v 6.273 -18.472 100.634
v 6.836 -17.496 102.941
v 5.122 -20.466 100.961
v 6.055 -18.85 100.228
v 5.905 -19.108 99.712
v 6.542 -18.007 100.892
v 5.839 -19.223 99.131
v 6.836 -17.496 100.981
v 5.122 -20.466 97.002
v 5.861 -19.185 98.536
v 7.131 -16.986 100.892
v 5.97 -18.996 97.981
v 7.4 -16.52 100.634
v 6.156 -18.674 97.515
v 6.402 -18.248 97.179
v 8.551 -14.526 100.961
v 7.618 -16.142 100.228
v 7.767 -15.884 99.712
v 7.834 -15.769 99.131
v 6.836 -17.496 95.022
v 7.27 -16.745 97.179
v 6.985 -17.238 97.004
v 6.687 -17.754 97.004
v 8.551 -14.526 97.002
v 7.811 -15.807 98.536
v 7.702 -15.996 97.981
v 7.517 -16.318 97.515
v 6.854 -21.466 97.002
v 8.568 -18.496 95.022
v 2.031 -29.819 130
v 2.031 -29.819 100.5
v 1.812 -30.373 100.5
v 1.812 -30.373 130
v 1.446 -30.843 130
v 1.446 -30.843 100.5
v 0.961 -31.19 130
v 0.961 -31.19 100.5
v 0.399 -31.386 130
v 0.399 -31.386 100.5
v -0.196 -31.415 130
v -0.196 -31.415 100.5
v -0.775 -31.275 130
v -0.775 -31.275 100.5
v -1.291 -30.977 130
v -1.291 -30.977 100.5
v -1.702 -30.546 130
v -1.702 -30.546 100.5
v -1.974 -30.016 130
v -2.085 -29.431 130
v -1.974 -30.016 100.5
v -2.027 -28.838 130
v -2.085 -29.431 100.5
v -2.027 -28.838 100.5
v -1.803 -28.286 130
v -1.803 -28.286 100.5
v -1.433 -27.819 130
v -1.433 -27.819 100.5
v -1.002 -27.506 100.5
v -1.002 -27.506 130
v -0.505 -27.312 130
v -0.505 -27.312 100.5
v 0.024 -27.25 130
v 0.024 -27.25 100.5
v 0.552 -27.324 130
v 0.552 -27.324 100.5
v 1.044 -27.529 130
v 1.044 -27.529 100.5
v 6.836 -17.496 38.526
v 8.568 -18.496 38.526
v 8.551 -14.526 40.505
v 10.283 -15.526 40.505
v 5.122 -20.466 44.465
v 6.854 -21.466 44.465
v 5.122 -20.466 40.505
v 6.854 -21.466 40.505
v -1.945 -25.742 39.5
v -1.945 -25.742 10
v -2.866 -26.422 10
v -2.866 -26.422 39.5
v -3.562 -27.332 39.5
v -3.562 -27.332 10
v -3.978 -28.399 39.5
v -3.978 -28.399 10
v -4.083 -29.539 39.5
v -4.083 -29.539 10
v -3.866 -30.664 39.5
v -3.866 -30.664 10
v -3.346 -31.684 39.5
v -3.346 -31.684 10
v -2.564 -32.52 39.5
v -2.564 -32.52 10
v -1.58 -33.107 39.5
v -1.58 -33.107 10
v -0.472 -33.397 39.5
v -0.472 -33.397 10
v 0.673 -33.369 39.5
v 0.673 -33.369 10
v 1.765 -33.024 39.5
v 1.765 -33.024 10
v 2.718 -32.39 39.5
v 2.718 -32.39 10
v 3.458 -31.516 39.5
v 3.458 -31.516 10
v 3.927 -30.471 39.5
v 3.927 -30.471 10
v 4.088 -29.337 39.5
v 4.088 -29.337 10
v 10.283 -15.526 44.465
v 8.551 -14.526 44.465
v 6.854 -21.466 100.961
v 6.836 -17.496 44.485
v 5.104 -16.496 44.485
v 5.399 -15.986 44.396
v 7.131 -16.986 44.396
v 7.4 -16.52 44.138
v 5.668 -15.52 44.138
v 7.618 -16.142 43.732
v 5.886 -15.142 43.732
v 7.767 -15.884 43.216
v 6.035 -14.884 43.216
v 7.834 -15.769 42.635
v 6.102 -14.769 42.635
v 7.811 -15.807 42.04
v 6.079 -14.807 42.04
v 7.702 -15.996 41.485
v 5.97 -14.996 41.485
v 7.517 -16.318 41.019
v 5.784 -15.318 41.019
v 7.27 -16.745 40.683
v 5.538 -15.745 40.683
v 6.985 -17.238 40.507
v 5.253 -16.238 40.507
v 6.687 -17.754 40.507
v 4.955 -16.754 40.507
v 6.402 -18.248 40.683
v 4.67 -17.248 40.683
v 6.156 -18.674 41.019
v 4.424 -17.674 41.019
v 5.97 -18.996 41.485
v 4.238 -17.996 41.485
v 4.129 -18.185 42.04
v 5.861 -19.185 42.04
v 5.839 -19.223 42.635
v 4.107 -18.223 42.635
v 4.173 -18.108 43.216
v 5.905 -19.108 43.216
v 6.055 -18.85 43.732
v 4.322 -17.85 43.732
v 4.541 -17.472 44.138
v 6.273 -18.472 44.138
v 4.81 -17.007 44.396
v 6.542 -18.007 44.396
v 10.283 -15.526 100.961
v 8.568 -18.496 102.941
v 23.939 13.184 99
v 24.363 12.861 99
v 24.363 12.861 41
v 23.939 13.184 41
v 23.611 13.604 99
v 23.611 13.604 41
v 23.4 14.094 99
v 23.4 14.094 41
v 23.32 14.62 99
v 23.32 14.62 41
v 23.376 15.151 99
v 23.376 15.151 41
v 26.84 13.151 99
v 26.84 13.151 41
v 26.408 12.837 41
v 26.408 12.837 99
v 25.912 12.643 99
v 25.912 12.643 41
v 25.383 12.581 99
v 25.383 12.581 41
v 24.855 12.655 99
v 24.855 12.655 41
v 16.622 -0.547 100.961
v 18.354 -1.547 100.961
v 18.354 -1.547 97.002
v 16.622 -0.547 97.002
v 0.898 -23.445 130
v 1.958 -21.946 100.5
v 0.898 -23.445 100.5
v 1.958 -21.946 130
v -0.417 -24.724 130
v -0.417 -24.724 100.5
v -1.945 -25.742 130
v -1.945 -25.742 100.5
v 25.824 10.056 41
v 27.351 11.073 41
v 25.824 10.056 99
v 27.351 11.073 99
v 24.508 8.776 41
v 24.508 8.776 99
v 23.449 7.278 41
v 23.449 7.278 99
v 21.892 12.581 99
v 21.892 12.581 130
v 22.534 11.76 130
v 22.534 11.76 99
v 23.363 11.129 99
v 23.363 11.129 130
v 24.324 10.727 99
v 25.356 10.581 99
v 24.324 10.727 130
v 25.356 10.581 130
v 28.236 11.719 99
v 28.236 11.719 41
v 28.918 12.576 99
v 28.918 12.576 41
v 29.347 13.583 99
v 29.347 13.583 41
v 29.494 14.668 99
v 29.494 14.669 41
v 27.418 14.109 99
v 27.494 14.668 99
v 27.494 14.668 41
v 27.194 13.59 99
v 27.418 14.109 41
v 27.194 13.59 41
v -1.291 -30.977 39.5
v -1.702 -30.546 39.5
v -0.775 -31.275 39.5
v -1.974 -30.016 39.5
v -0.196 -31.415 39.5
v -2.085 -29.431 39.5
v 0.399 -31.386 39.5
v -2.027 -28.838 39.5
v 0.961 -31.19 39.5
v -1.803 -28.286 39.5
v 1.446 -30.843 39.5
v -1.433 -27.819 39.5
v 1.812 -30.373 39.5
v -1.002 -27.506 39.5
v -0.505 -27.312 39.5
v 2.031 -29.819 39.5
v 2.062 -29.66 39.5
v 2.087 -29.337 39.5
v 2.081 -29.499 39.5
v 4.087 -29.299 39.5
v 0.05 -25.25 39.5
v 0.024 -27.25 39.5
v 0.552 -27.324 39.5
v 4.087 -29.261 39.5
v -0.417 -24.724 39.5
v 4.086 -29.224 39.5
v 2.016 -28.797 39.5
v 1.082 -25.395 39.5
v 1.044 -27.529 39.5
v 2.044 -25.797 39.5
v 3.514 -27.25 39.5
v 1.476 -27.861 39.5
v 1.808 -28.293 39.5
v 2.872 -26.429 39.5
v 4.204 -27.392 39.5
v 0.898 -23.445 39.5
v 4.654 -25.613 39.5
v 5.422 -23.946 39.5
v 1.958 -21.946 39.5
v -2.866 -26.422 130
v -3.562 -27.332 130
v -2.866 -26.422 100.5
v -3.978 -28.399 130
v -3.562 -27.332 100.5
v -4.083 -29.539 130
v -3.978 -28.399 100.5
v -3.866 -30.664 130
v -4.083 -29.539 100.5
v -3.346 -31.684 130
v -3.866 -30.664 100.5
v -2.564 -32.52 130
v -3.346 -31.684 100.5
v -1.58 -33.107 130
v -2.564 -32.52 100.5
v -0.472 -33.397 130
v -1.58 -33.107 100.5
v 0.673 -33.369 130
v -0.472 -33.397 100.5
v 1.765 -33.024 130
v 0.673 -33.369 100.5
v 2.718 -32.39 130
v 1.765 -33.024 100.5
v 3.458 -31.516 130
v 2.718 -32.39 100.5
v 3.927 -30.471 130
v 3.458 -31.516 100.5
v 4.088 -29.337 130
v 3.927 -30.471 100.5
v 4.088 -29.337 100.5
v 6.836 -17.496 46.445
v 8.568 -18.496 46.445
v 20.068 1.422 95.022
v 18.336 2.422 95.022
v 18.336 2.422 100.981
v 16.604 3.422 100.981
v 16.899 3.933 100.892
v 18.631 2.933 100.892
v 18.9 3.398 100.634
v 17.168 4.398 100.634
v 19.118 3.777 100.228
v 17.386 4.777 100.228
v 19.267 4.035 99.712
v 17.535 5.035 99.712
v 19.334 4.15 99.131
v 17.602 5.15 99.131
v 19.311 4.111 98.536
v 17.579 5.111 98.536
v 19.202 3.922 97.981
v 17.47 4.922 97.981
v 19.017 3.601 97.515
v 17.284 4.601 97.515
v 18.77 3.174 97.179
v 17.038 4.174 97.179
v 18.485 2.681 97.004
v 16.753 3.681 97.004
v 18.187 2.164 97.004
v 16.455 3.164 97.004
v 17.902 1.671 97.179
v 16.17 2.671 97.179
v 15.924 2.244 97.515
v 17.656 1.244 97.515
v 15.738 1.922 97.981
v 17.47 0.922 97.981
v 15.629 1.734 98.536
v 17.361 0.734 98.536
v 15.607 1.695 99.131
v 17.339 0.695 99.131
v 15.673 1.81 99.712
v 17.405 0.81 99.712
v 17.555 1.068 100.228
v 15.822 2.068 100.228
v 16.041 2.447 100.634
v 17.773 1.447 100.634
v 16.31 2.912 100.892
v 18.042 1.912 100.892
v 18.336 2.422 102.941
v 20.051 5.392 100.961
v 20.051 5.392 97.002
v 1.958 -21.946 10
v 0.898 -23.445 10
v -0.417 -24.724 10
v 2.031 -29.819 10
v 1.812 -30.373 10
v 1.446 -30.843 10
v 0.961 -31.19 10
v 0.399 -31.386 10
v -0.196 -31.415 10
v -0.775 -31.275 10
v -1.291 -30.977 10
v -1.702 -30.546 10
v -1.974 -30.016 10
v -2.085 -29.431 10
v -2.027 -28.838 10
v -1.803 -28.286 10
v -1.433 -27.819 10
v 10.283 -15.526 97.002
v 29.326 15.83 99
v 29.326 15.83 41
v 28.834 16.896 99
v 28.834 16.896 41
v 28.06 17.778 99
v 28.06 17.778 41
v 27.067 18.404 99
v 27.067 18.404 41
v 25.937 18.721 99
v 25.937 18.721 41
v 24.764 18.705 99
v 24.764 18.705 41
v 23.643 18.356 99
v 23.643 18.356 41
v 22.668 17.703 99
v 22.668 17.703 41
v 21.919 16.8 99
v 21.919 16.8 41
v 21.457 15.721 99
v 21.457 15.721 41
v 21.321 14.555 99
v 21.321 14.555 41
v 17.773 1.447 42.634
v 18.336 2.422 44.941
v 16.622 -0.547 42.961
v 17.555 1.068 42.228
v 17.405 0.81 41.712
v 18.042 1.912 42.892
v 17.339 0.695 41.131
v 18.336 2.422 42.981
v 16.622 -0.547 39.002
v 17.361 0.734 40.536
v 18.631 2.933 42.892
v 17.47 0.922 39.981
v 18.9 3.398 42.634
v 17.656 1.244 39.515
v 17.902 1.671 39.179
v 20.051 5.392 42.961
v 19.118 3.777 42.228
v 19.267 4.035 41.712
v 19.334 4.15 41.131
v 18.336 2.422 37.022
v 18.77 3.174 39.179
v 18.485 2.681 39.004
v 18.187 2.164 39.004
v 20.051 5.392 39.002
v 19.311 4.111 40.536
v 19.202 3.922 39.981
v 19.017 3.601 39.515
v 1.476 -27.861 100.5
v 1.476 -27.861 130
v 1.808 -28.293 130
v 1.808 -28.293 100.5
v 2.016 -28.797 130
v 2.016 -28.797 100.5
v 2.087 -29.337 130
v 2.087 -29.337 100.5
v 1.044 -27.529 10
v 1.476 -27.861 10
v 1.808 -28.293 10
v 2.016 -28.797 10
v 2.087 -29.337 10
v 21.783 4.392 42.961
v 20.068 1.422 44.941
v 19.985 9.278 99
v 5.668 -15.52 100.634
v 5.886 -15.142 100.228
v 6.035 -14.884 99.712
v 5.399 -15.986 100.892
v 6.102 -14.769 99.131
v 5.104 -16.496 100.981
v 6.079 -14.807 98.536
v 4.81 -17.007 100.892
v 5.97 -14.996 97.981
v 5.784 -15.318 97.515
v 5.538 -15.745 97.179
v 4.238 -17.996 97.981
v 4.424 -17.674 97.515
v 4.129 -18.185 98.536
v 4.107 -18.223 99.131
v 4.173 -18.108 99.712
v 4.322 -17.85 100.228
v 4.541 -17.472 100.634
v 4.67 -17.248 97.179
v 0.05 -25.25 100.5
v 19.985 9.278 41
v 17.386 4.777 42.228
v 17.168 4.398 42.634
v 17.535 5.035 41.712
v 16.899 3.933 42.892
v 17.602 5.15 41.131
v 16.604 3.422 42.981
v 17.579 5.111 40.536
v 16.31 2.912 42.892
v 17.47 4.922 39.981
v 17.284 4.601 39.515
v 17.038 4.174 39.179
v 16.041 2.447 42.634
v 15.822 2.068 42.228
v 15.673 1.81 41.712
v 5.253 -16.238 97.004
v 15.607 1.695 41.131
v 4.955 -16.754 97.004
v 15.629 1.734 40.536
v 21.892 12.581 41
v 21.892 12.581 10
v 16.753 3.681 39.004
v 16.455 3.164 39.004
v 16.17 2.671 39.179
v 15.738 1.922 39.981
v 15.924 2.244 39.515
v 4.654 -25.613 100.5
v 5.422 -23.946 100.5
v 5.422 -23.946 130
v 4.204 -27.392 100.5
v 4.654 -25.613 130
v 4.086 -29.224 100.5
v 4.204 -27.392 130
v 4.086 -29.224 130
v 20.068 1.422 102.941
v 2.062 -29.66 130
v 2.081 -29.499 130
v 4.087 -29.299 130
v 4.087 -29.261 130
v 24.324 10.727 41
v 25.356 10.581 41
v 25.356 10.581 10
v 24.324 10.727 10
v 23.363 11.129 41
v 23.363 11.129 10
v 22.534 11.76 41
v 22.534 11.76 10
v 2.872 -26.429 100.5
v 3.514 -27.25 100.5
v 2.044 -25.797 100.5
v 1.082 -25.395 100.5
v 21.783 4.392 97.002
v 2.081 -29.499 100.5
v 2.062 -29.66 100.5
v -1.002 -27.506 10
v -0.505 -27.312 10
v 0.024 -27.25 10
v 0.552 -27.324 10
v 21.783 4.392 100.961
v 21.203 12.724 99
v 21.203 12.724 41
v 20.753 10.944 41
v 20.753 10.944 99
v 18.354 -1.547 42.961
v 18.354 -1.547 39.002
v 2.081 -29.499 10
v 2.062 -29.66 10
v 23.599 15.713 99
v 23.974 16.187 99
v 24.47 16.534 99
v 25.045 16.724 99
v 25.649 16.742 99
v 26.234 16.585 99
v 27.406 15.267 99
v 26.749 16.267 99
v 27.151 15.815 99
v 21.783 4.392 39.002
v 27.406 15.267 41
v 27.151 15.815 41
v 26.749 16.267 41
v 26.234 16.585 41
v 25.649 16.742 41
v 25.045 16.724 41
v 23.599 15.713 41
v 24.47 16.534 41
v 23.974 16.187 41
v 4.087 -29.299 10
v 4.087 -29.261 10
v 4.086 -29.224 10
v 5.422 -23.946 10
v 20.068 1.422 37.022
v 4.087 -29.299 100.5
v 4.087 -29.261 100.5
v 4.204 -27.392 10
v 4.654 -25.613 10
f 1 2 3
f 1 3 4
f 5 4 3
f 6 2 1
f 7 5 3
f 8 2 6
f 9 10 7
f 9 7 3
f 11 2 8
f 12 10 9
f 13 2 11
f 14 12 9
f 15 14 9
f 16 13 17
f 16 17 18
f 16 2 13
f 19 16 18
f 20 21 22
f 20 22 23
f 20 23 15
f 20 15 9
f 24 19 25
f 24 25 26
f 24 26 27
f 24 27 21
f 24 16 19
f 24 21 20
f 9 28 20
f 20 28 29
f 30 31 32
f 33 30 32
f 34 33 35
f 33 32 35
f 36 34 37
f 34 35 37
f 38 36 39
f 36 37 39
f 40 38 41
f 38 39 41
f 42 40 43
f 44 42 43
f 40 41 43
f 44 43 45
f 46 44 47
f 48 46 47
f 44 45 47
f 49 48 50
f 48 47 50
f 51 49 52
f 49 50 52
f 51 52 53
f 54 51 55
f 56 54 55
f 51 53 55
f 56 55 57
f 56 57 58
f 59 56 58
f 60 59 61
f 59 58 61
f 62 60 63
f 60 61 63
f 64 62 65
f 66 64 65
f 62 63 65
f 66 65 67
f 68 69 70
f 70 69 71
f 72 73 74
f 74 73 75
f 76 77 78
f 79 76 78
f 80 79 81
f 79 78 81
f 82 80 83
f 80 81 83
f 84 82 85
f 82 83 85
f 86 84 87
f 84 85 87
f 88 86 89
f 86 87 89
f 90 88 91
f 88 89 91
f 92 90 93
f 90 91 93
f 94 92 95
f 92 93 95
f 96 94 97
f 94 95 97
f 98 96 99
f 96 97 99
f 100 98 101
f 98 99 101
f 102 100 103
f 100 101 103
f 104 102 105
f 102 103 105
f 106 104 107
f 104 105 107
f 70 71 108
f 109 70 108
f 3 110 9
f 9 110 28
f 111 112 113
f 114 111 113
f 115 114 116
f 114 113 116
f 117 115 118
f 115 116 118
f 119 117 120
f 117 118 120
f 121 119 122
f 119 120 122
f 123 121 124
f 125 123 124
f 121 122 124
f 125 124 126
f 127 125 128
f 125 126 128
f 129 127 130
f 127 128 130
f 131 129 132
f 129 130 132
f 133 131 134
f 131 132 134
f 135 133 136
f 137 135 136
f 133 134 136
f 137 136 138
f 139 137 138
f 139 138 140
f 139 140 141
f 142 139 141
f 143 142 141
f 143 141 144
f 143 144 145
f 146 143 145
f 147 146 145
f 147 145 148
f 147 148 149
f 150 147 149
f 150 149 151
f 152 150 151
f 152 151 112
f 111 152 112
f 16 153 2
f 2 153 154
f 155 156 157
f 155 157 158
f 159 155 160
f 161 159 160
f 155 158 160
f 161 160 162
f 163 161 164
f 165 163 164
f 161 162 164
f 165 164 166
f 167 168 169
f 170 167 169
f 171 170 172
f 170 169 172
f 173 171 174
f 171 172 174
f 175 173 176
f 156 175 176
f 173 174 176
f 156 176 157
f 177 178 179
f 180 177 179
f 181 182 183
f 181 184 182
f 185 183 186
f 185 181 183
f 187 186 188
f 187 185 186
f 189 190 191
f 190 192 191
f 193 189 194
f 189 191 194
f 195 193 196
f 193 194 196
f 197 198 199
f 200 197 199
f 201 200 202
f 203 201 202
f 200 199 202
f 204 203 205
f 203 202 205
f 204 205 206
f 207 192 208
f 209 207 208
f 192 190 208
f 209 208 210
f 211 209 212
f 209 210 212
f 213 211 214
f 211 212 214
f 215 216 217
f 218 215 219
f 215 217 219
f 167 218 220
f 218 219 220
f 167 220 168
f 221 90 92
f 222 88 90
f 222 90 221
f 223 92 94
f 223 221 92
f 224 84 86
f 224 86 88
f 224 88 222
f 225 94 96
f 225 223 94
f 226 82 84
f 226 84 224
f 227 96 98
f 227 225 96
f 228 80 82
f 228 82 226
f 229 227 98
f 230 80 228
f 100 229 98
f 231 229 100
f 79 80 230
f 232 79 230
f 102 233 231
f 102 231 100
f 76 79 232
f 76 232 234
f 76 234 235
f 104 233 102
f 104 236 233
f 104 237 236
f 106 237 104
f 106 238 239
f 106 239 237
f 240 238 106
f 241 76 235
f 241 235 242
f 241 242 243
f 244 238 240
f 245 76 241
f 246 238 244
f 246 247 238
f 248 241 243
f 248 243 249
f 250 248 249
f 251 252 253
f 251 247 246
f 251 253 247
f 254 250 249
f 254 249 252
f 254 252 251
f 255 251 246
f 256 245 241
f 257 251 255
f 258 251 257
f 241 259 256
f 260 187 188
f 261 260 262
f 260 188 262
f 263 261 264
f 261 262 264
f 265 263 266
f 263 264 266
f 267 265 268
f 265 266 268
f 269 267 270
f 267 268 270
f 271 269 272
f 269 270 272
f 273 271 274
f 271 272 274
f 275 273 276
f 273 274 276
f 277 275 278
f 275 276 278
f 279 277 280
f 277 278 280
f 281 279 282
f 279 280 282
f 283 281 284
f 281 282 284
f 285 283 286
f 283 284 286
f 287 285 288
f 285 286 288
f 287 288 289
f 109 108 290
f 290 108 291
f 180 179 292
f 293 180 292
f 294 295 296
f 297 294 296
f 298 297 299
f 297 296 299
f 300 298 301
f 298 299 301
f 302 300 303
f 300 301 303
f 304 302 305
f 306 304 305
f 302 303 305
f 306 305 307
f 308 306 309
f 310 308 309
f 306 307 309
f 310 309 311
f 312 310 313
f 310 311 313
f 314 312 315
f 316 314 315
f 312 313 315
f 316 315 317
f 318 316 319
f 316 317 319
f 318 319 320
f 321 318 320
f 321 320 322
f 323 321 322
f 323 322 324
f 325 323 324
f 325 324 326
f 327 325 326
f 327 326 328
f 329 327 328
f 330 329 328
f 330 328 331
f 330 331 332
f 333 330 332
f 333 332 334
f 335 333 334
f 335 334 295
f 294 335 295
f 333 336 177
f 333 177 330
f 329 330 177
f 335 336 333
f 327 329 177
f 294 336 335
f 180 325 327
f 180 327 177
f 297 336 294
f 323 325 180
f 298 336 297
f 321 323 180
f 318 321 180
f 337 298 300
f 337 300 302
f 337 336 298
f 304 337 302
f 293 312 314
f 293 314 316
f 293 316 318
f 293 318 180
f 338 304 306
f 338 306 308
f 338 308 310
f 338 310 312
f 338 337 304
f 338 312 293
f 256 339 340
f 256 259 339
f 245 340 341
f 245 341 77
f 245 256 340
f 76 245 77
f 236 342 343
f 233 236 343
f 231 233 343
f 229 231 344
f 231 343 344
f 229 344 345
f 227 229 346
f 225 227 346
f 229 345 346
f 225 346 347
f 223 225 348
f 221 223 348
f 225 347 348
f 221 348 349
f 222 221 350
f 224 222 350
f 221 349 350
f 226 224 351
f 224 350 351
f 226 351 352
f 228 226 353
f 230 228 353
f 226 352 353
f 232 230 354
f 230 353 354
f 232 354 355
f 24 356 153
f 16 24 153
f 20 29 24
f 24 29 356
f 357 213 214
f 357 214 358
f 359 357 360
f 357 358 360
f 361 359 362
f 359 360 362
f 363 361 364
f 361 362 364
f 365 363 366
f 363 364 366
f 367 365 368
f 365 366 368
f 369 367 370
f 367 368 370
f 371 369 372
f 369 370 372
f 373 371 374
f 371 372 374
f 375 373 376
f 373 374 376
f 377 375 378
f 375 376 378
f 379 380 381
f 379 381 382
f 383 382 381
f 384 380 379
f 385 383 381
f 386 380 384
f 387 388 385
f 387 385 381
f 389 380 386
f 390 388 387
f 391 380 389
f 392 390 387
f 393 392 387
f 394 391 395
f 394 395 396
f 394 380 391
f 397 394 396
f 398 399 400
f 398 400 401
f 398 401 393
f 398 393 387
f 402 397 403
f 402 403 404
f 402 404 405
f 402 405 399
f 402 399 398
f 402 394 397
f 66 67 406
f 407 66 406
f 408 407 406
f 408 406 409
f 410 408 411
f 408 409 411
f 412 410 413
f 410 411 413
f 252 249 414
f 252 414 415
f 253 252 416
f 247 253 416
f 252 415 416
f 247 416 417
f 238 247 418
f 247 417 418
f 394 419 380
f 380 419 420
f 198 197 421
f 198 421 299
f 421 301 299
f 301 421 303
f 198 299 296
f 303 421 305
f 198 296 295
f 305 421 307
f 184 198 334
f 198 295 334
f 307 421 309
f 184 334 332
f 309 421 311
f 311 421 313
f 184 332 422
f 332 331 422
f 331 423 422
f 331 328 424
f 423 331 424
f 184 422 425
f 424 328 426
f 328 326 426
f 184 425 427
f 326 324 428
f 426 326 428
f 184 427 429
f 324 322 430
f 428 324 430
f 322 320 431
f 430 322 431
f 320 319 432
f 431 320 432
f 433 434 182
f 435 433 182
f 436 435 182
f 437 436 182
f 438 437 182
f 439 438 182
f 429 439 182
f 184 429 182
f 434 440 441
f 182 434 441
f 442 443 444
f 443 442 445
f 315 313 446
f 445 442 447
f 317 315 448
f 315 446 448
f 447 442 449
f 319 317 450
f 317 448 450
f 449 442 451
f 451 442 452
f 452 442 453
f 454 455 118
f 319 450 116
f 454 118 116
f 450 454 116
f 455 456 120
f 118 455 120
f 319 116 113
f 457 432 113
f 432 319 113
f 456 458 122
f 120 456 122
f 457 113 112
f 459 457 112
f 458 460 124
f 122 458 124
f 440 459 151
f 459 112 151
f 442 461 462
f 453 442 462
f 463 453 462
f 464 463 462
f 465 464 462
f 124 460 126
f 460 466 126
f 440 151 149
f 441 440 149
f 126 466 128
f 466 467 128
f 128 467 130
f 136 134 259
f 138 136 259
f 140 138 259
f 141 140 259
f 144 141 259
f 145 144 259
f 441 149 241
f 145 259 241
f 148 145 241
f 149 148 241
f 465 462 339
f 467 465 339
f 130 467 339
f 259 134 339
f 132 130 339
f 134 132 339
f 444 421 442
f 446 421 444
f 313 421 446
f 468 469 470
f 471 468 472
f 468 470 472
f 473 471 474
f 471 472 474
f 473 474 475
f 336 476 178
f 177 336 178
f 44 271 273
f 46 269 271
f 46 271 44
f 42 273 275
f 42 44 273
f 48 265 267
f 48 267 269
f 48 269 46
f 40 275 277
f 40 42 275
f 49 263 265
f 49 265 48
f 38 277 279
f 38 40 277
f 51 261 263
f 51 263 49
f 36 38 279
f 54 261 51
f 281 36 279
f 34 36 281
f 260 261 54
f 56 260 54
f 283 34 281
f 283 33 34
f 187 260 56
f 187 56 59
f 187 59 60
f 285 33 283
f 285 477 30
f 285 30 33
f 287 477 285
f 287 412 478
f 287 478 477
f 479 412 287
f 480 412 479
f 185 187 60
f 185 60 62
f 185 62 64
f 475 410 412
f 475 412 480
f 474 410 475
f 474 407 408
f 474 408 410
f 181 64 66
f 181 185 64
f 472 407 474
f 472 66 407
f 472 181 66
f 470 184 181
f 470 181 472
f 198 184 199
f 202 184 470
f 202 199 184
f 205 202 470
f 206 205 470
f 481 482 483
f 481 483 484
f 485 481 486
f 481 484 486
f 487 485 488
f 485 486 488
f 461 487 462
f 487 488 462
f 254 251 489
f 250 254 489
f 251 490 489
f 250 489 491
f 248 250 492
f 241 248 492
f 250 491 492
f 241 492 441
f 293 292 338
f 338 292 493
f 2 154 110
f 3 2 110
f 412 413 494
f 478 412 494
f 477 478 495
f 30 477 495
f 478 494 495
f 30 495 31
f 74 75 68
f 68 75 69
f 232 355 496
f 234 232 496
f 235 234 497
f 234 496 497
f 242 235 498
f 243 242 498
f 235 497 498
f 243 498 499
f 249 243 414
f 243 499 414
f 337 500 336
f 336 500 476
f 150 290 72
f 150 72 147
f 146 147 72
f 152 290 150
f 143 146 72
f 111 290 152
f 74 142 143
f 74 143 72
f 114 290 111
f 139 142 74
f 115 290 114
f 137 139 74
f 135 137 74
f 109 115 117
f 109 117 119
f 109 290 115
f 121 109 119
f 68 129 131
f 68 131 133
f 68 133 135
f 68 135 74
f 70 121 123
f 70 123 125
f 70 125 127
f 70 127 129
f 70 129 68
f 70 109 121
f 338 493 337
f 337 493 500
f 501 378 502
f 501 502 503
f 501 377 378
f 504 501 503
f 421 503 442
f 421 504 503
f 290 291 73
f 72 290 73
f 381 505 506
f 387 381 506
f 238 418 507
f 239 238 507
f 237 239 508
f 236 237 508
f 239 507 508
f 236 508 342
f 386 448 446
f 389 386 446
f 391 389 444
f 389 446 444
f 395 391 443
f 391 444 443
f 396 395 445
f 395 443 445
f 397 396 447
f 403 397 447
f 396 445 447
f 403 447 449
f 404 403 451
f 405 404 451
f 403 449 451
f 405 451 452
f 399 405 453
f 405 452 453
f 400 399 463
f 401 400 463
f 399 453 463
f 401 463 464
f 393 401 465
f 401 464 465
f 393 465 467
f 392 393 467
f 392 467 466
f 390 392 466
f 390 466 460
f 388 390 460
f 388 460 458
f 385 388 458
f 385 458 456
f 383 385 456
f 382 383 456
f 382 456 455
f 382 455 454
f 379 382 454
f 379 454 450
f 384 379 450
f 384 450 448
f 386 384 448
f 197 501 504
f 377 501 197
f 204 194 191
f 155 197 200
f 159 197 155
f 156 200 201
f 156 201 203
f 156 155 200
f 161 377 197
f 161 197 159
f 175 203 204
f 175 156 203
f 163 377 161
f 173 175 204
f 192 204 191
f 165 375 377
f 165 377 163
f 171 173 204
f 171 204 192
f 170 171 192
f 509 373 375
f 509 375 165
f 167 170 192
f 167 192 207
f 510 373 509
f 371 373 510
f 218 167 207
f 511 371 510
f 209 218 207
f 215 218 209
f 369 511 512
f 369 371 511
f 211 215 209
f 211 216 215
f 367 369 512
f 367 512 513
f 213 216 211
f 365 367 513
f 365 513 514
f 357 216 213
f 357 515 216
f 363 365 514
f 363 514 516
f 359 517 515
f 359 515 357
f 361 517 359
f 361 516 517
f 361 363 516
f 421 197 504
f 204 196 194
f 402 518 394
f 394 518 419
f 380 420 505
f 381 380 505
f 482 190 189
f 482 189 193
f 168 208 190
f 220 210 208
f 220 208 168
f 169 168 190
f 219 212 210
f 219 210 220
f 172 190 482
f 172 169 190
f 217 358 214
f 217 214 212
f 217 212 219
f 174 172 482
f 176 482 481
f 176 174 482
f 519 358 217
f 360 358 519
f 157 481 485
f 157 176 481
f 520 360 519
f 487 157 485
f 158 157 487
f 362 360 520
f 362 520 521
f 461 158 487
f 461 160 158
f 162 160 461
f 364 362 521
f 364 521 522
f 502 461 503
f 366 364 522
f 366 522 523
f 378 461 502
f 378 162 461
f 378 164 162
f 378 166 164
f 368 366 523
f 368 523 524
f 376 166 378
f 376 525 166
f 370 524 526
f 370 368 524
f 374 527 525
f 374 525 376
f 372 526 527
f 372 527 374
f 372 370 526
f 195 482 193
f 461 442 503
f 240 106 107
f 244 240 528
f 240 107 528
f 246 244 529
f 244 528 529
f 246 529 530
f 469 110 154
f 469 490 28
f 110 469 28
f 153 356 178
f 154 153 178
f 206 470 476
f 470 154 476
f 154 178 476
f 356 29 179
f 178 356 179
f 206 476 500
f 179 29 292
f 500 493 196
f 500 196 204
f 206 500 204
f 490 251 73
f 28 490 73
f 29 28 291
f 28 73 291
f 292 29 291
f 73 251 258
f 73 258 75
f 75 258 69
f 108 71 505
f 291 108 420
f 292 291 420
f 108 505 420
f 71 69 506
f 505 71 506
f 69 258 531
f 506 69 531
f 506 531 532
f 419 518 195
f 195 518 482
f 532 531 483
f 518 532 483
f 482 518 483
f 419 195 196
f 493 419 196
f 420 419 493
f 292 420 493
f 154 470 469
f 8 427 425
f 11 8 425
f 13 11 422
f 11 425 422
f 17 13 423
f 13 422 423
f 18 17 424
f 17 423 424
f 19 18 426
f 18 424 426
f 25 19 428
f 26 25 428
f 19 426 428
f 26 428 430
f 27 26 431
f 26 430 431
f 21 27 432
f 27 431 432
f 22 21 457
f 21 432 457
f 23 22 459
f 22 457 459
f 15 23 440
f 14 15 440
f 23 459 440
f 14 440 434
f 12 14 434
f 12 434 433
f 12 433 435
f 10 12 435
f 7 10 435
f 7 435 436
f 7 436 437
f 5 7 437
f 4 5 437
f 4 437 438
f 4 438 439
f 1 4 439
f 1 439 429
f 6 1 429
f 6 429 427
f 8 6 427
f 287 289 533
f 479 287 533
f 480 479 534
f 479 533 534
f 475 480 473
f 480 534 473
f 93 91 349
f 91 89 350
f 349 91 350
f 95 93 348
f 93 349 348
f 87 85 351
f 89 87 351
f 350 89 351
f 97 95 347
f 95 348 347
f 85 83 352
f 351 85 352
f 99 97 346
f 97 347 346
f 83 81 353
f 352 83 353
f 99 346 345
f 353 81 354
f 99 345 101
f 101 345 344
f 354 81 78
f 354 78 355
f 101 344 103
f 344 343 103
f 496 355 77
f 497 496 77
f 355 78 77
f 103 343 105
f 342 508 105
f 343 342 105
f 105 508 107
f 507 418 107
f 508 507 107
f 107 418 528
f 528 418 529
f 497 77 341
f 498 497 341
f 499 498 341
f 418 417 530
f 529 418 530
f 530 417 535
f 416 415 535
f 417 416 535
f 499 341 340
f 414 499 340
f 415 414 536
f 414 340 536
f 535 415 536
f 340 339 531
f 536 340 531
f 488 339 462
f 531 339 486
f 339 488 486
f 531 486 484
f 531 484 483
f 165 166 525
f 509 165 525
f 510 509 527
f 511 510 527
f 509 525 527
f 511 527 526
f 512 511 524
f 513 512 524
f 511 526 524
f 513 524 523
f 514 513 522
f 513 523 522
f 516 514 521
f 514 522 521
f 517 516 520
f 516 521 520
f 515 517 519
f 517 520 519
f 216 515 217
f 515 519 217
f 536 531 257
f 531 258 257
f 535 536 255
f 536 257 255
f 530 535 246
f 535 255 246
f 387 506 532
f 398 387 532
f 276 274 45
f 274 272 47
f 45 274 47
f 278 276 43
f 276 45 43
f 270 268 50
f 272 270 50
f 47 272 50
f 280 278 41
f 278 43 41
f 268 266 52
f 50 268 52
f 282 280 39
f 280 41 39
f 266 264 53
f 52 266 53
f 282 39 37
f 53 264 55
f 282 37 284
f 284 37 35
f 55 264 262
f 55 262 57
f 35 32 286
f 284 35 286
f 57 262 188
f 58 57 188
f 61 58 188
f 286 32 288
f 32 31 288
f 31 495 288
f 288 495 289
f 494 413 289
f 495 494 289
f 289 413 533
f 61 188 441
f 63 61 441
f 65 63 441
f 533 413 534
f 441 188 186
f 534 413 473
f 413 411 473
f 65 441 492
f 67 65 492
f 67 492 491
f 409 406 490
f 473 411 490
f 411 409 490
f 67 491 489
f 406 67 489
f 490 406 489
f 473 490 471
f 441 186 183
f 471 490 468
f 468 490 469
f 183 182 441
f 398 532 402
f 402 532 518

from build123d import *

# Parameters (mm, degrees)
SKETCH2_R               = 1.5875
BOSS_EXTRUDE1_DEPTH     = 10
BOSS_EXTRUDE2_DEPTH     = 120
SKETCH4_R               = 4.0875
CUT_EXTRUDE1_DEPTH      = 30.5
CUT_EXTRUDE1_DEPTH_BACK = 30.5
SKETCH5_R               = 4.0875
CUT_EXTRUDE2_DEPTH      = 31
SKETCH6_R               = 4.0875
CUT_EXTRUDE3_DEPTH      = 31
FILLET1_R               = 10
SKETCH7_R               = 2
CUT_EXTRUDE4_DEPTH      = 4
CUT_EXTRUDE5_DEPTH      = 2


with BuildPart() as part:
    # Sketch2 → Boss-Extrude1 (new body)
    with BuildSketch(Plane.XY):
        with BuildLine():
            Line((0, -27.7495), (0, 0))
            Line((0, 0), (38.1, 0))
            ThreePointArc((38.1, 0), (-26.940768363, 26.940768363), (0, -38.1))
            Line((0, -38.1), (0, -30.9245))
            ThreePointArc((0, -30.9245), (-1.5875, -29.337), (0, -27.7495))
        make_face()
        with Locations((-25.406587271, 14.6685)):
            Circle(SKETCH2_R, mode=Mode.SUBTRACT)
        with Locations((25.406587271, 14.6685)):
            Circle(SKETCH2_R, mode=Mode.SUBTRACT)
        with BuildLine():
            Line((38.1, 0), (0, 0))
            Line((0, 0), (0, -27.7495))
            ThreePointArc((0, -27.7495), (1.122532015, -28.214467985), (1.5875, -29.337))
            ThreePointArc((1.5875, -29.337), (1.122532015, -30.459532015), (0, -30.9245))
            Line((0, -30.9245), (0, -38.1))
            ThreePointArc((0, -38.1), (26.940768363, -26.940768363), (38.1, 0))
        make_face()
    extrude(amount=BOSS_EXTRUDE1_DEPTH)


with BuildPart() as body_2:
    # Sketch3 → Boss-Extrude2 (new body)
    with BuildSketch(Plane.XY.offset(10)):
        with BuildLine():
            ThreePointArc((29.494087271, 14.6685), (24.324372064, 18.610132466), (21.892146477, 12.581309985))
            Line((21.892146477, 12.581309985), (23.37551462, 15.150578976))
            ThreePointArc((23.37551462, 15.150578976), (25.649272347, 16.741845172), (27.494087271, 14.6685))
            ThreePointArc((27.494087271, 14.6685), (27.323499399, 13.841998855), (26.839616236, 13.150578976))
            Line((26.839616236, 13.150578976), (25.356248092, 10.581309985))
            ThreePointArc((25.356248092, 10.581309985), (28.279033516, 11.760457906), (29.494087271, 14.6685))
        make_face()
        with BuildLine():
            Line((24.362837271, 12.86067197), (23.362837271, 11.128621162))
            ThreePointArc((23.362837271, 11.128621162), (24.324372064, 10.726867534), (25.356248092, 10.581309985))
            Line((25.356248092, 10.581309985), (26.839616236, 13.150578976))
            ThreePointArc((26.839616236, 13.150578976), (25.649272347, 12.595154828), (24.362837271, 12.86067197))
        make_face()
        with BuildLine():
            ThreePointArc((21.892146477, 12.581309985), (22.534141026, 11.760457906), (23.362837271, 11.128621162))
            Line((23.362837271, 11.128621162), (24.362837271, 12.86067197))
            ThreePointArc((24.362837271, 12.86067197), (23.489675143, 13.841998855), (23.37551462, 15.150578976))
            Line((23.37551462, 15.150578976), (21.892146477, 12.581309985))
        make_face()
        with BuildLine():
            Line((23.362837271, 11.128621162), (2.04375, -25.797121162))
            ThreePointArc((2.04375, -25.797121162), (2.872446245, -26.428957906), (3.514440794, -27.249809985))
            Line((3.514440794, -27.249809985), (25.356248092, 10.581309985))
            ThreePointArc((25.356248092, 10.581309985), (24.324372064, 10.726867534), (23.362837271, 11.128621162))
        make_face()
        with BuildLine():
            ThreePointArc((0.050339179, -25.249809985), (1.082215206, -25.395367534), (2.04375, -25.797121162))
            Line((2.04375, -25.797121162), (23.362837271, 11.128621162))
            ThreePointArc((23.362837271, 11.128621162), (22.534141026, 11.760457906), (21.892146477, 12.581309985))
            Line((21.892146477, 12.581309985), (0.050339179, -25.249809985))
        make_face()
        with BuildLine():
            ThreePointArc((-1.433028965, -27.819078976), (-0.242685076, -27.263654828), (1.04375, -27.52917197))
            Line((1.04375, -27.52917197), (2.04375, -25.797121162))
            ThreePointArc((2.04375, -25.797121162), (1.082215206, -25.395367534), (0.050339179, -25.249809985))
            Line((0.050339179, -25.249809985), (-1.433028965, -27.819078976))
        make_face()
        with BuildLine():
            Line((2.04375, -25.797121162), (1.04375, -27.52917197))
            ThreePointArc((1.04375, -27.52917197), (1.80782803, -28.29325), (2.0875, -29.337))
            ThreePointArc((2.0875, -29.337), (2.073345172, -29.579685076), (2.03107265, -29.819078976))
            Line((2.03107265, -29.819078976), (3.514440794, -27.249809985))
            ThreePointArc((3.514440794, -27.249809985), (2.872446245, -26.428957906), (2.04375, -25.797121162))
        make_face()
        with BuildLine():
            ThreePointArc((2.03107265, -29.819078976), (-1.04375, -31.14482803), (-1.433028965, -27.819078976))
            Line((-1.433028965, -27.819078976), (0.050339179, -25.249809985))
            ThreePointArc((0.050339179, -25.249809985), (-2.908042094, -32.209446245), (4.0875, -29.337))
            ThreePointArc((4.0875, -29.337), (3.941632466, -28.254784794), (3.514440794, -27.249809985))
            Line((3.514440794, -27.249809985), (2.03107265, -29.819078976))
        make_face()
    extrude(amount=BOSS_EXTRUDE2_DEPTH)

    # Sketch4 → Cut-Extrude1 (cut, two sides)
    with BuildSketch(Plane.XY.offset(70)) as cut_extrude1_sk:
        with Locations((0, -29.337)):
            Circle(SKETCH4_R)
    extrude(amount=CUT_EXTRUDE1_DEPTH, mode=Mode.SUBTRACT)
    extrude(cut_extrude1_sk.sketch, amount=-CUT_EXTRUDE1_DEPTH_BACK, mode=Mode.SUBTRACT)

    # Sketch5 → Cut-Extrude2 (cut)
    with BuildSketch(Plane(origin=(0, 0, 10), x_dir=(-1, 0, 0), z_dir=(0, 0, -1))):
        with Locations((-25.406587271, 14.6685)):
            Circle(SKETCH5_R)
    extrude(amount=-CUT_EXTRUDE2_DEPTH, mode=Mode.SUBTRACT)

    # Sketch6 → Cut-Extrude3 (cut)
    with BuildSketch(Plane.XY.offset(130)):
        with Locations((25.406587271, 14.6685)):
            Circle(SKETCH6_R)
    extrude(amount=-CUT_EXTRUDE3_DEPTH, mode=Mode.SUBTRACT)

    # Fillet1
    fillet1_edges = [body_2.edges().sort_by_distance(p)[0] for p in [
        (0.050339179, -25.249809985, 115.25),
        (3.514440794, -27.249809985, 115.25),
        (0.050339179, -25.249809985, 24.75),
        (3.514440794, -27.249809985, 24.75),
        (21.892146477, 12.581309985, 70),
        (25.356248092, 10.581309985, 70),
    ]]
    fillet(fillet1_edges, radius=FILLET1_R)

    # Sketch7 → Cut-Extrude4 (cut)
    with BuildSketch(Plane(origin=(10.971242828, -6.33425, 0), x_dir=(0, 0, 1), z_dir=(-0.866025404, 0.5, 0))):
        with Locations((40.981352926, 11.266107412)):
            Circle(SKETCH7_R)
        with Locations((42.485061868, -11.733892588)):
            Circle(SKETCH7_R)
        with Locations((98.981352926, -11.733892588)):
            Circle(SKETCH7_R)
        with Locations((98.981352926, 11.266107412)):
            Circle(SKETCH7_R)
    extrude(amount=-CUT_EXTRUDE4_DEPTH, mode=Mode.SUBTRACT)

    # Sketch8 → Cut-Extrude5 (cut)
    with BuildSketch(Plane(origin=(14.435344443, -8.33425, 0), x_dir=(0, 0, -1), z_dir=(0.866025404, -0.5, 0))):
        Polygon((-37.02188478, 11.266107412), (-39.001618853, 14.695107412), (-42.961086999, 14.695107412), (-44.940821072, 11.266107412), (-42.961086999, 7.837107412), (-39.001618853, 7.837107412), align=None)
        Polygon((-38.525593722, -11.733892588), (-40.505327795, -8.304892588), (-44.464795941, -8.304892588), (-46.444530014, -11.733892588), (-44.464795941, -15.162892588), (-40.505327795, -15.162892588), align=None)
        Polygon((-95.02188478, 11.266107412), (-97.001618853, 14.695107412), (-100.961086999, 14.695107412), (-102.940821072, 11.266107412), (-100.961086999, 7.837107412), (-97.001618853, 7.837107412), align=None)
        Polygon((-95.02188478, -11.733892588), (-97.001618853, -8.304892588), (-100.961086999, -8.304892588), (-102.940821072, -11.733892588), (-100.961086999, -15.162892588), (-97.001618853, -15.162892588), align=None)
    extrude(amount=-CUT_EXTRUDE5_DEPTH, mode=Mode.SUBTRACT)


solid = body_2.part
